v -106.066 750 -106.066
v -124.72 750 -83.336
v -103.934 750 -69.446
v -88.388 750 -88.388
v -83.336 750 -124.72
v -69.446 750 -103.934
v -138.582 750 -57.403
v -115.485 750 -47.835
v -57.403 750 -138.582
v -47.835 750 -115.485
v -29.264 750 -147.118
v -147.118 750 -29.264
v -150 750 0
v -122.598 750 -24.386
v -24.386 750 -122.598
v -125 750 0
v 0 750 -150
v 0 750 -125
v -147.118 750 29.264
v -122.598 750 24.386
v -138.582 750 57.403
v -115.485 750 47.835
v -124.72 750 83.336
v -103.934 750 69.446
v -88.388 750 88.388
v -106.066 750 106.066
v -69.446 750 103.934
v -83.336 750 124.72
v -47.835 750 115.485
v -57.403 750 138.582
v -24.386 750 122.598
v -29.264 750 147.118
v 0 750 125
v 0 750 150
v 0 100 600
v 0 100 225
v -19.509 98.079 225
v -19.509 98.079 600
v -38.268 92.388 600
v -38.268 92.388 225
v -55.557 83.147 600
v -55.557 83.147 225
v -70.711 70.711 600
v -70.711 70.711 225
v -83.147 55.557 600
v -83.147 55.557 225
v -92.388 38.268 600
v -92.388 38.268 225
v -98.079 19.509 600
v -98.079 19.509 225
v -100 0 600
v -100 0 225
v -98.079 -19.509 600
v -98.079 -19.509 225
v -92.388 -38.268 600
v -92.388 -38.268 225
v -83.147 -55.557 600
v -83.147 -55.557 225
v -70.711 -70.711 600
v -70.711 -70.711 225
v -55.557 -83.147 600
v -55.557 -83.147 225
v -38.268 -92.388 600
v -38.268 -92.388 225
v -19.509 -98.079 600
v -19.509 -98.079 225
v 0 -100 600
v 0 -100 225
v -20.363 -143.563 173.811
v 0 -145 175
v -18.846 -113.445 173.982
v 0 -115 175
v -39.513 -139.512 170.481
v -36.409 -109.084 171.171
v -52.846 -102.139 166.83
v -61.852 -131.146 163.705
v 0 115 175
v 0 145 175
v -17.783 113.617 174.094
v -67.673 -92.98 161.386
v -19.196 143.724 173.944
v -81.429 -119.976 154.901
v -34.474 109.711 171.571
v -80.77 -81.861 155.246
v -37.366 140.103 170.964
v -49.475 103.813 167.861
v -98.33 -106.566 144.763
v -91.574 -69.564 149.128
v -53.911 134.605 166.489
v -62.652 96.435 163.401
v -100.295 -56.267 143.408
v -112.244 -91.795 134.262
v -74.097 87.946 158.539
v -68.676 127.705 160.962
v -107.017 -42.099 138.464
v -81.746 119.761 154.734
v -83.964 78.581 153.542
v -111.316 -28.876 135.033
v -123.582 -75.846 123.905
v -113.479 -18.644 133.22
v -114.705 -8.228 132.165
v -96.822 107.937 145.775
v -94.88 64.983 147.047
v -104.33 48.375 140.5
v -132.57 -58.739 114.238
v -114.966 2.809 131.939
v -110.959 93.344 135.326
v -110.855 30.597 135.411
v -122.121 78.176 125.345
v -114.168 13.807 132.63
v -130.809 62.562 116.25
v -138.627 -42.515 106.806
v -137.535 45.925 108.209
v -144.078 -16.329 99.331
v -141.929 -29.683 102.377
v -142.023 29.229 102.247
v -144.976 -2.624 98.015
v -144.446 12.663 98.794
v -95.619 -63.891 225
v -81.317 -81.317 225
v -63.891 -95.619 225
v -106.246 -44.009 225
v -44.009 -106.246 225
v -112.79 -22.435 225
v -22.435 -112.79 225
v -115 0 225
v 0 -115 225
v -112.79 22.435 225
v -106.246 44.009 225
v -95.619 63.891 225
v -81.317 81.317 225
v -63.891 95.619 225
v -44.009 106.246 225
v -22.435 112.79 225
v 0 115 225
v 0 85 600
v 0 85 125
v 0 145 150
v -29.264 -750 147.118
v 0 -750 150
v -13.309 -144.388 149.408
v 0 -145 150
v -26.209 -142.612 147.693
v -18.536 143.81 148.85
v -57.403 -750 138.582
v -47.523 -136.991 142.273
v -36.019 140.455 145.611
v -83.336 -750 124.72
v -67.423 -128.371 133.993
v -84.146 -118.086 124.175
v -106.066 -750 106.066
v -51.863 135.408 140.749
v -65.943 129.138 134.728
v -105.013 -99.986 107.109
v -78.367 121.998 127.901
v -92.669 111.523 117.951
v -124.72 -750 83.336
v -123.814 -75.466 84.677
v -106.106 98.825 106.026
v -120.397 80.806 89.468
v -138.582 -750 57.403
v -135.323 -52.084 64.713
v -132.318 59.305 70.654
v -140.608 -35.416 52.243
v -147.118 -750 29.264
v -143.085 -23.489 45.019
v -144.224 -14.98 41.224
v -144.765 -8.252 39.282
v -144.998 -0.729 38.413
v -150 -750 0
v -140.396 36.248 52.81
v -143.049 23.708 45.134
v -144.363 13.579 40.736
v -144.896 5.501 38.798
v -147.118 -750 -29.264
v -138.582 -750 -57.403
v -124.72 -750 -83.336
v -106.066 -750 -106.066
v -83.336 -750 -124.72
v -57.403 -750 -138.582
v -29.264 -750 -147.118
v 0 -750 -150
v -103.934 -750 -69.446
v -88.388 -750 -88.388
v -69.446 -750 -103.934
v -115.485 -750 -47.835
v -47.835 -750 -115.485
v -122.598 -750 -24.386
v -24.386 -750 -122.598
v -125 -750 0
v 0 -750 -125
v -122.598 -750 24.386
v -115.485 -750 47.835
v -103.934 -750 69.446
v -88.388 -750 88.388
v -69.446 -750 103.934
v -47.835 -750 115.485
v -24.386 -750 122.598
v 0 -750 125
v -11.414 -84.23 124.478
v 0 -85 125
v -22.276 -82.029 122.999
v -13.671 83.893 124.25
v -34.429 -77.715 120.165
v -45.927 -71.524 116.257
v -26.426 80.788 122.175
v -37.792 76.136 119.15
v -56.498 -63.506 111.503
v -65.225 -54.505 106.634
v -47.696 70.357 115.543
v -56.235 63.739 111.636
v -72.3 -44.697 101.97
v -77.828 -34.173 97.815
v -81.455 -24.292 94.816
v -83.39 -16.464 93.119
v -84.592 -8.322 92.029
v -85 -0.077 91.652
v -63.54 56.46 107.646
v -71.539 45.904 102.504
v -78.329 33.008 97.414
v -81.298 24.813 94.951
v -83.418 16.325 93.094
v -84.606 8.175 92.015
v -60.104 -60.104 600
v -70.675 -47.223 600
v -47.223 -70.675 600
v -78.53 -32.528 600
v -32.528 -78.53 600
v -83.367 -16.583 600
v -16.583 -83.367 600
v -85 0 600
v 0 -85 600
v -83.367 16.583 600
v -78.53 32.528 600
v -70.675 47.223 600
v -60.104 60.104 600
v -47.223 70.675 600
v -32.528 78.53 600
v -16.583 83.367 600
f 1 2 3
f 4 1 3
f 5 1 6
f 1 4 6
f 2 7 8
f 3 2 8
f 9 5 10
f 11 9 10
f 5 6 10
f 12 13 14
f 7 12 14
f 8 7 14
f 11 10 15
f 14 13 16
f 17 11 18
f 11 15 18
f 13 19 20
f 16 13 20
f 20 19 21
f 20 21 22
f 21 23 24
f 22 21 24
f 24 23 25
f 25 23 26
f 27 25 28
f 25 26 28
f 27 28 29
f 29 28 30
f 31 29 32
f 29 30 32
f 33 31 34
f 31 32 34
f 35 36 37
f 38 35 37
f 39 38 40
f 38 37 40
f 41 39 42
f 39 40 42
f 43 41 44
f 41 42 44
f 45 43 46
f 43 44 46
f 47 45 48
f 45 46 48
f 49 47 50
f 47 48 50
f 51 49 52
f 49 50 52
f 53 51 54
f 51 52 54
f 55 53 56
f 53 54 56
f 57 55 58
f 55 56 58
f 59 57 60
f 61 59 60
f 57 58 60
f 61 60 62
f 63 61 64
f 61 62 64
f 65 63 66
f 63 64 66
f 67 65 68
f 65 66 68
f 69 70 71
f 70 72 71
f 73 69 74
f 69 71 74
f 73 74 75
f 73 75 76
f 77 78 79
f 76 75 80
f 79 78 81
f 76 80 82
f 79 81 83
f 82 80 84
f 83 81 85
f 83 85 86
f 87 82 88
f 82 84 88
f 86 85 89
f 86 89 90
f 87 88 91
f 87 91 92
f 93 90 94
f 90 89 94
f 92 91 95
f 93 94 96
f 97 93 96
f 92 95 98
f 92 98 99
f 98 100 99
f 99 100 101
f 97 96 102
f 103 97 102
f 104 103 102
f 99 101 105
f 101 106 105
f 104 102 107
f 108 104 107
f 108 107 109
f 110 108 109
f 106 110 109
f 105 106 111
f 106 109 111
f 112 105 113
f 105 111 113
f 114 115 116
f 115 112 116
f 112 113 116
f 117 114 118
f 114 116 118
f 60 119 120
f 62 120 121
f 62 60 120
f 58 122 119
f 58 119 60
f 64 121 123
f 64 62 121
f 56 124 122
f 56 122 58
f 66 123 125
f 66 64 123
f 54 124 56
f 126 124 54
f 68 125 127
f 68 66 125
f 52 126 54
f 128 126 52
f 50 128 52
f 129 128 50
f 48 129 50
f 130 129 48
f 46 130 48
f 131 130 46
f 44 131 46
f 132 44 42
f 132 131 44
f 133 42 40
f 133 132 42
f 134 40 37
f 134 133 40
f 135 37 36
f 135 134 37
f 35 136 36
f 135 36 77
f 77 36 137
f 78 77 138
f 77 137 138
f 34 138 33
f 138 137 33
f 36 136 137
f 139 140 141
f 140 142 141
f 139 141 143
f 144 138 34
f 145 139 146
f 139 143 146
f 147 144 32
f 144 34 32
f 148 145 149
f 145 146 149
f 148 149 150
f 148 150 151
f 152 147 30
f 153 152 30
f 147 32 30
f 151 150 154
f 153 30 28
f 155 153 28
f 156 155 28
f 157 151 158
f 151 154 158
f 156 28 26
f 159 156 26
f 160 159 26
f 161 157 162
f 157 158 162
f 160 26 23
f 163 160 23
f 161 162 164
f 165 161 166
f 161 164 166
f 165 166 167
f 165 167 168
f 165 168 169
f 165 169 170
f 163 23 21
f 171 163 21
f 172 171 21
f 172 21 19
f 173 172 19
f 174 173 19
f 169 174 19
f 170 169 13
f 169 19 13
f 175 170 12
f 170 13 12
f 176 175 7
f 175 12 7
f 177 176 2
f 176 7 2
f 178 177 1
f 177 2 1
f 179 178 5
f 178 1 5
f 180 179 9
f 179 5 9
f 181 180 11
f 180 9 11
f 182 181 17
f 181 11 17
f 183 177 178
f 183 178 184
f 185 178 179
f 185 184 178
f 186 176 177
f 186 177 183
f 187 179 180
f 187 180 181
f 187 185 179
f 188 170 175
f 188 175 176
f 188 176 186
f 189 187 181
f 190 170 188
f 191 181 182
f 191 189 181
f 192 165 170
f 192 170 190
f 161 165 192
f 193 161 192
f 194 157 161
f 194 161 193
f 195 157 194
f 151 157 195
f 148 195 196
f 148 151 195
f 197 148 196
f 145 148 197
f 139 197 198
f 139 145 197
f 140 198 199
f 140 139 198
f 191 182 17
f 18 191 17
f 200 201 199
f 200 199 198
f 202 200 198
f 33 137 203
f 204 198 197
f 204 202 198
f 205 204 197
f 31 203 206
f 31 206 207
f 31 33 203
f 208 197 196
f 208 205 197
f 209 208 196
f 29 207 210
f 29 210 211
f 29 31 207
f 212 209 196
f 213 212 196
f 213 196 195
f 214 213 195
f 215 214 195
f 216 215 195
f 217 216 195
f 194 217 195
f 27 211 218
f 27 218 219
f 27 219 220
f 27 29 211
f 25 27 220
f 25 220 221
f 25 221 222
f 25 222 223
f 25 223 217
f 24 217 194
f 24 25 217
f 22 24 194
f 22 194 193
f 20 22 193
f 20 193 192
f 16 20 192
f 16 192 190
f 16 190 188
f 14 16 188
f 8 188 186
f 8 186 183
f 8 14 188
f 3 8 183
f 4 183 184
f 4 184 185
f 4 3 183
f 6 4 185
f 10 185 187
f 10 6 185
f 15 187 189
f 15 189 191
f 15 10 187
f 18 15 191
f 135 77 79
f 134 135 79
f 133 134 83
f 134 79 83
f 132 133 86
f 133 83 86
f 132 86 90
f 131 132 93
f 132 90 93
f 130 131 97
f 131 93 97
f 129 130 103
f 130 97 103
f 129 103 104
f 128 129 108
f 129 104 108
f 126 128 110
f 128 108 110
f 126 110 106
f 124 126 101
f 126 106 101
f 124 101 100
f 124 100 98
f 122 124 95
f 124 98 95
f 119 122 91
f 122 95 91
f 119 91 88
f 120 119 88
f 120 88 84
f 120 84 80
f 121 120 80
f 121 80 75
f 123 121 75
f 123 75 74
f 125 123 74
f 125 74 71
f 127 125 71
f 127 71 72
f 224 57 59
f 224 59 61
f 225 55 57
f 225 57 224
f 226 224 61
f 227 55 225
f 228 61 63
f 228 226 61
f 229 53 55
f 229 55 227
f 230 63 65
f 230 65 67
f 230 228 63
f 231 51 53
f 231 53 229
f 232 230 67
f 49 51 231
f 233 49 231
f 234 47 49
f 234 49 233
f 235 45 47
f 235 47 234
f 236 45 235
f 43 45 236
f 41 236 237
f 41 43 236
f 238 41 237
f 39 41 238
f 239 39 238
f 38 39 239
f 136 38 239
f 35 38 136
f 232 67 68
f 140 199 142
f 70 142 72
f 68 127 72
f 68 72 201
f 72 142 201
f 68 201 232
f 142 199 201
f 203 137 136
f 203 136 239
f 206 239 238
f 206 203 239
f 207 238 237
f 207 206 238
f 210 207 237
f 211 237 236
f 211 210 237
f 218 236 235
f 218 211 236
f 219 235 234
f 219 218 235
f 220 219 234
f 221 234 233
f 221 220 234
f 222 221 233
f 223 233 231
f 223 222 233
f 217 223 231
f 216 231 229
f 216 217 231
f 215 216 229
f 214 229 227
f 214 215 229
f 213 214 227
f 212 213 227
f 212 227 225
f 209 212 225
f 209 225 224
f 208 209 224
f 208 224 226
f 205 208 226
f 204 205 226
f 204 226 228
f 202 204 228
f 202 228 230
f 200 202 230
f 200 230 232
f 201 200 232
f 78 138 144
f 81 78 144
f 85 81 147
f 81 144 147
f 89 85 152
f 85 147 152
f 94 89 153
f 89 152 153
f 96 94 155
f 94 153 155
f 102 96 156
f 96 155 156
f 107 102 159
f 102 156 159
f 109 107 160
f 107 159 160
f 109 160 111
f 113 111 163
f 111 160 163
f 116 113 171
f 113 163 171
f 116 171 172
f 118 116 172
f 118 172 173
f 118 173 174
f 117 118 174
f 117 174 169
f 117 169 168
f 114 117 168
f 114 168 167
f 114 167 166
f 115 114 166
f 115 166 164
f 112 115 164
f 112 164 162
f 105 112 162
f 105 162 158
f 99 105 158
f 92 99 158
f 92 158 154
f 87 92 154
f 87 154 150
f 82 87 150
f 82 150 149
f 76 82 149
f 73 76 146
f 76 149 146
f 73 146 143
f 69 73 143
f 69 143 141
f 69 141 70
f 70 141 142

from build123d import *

# Parameters (mm, degrees)
BOX002_W               = 500
BOX002_H               = 1800
BOX002_DEPTH           = 1000
CYLINDER011_R          = 125
CYLINDER011_DEPTH      = 1500
CYLINDER011_ROLL_ANGLE = 90
BOX001_W               = 500
BOX001_H               = 1800
BOX001_DEPTH           = 1000
CYLINDER007_R          = 125
CYLINDER007_DEPTH      = 1500
CYLINDER007_ROLL_ANGLE = 90
CYLINDER006_R          = 85
CYLINDER006_DEPTH      = 600
CYLINDER002_R          = 115
CYLINDER002_DEPTH      = 225
CYLINDER001_R          = 150
CYLINDER001_DEPTH      = 1500
CYLINDER001_ROLL_ANGLE = 90
CYLINDER_R             = 100
CYLINDER_DEPTH         = 600
BOX_W                  = 500
BOX_H                  = 500
BOX_DEPTH              = 500
CYLINDER004_R          = 145
CYLINDER004_DEPTH      = 600
CYLINDER005_R          = 300
CYLINDER005_DEPTH      = 600
CYLINDER003_R          = 175
CYLINDER003_DEPTH      = 400
CYLINDER003_ROLL_ANGLE = 90
CYLINDER010_R          = 150
CYLINDER010_DEPTH      = 200
CYLINDER010_ROLL_ANGLE = 90
CYLINDER009_R          = 150
CYLINDER009_DEPTH      = 200
CYLINDER009_ROLL_ANGLE = 90


with BuildPart() as cube002:
    # Box002 → Box002 (new body)
    with BuildSketch(Plane(origin=(0, -815, -274), x_dir=(1, 0, 0), z_dir=(0, 0, 1))):
        with Locations((250, 900)):
            Rectangle(BOX002_W, BOX002_H)
    extrude(amount=BOX002_DEPTH)


with BuildPart() as cylinder011:
    # Cylinder011 → Cylinder011 (new body)
    with BuildSketch(Plane.XY):
        Circle(CYLINDER011_R)
    extrude(amount=CYLINDER011_DEPTH)


with BuildPart() as cylinder011_1:
    # Cylinder011 roll: moved
    add(cylinder011.part.rotate(Axis((0, 0, 0), (1, 0, 0)), CYLINDER011_ROLL_ANGLE))


with BuildPart() as cylinder011_2:
    # Cylinder011 placement: moved
    add(cylinder011_1.part.moved(Location((0, 750, 0))))


with BuildPart() as cube001:
    # Box001 → Box001 (new body)
    with BuildSketch(Plane(origin=(0, -815, -274), x_dir=(1, 0, 0), z_dir=(0, 0, 1))):
        with Locations((250, 900)):
            Rectangle(BOX001_W, BOX001_H)
    extrude(amount=BOX001_DEPTH)


with BuildPart() as cylinder007:
    # Cylinder007 → Cylinder007 (new body)
    with BuildSketch(Plane.XY):
        Circle(CYLINDER007_R)
    extrude(amount=CYLINDER007_DEPTH)


with BuildPart() as cylinder007_1:
    # Cylinder007 roll: moved
    add(cylinder007.part.rotate(Axis((0, 0, 0), (1, 0, 0)), CYLINDER007_ROLL_ANGLE))


with BuildPart() as cylinder007_2:
    # Cylinder007 placement: moved
    add(cylinder007_1.part.moved(Location((0, 750, 0))))


with BuildPart() as cylinder006:
    # Cylinder006 → Cylinder006 (new body)
    with BuildSketch(Plane.XY):
        Circle(CYLINDER006_R)
    extrude(amount=CYLINDER006_DEPTH)


with BuildPart() as cylinder002:
    # Cylinder002 → Cylinder002 (new body)
    with BuildSketch(Plane.XY):
        Circle(CYLINDER002_R)
    extrude(amount=CYLINDER002_DEPTH)


with BuildPart() as cylinder001:
    # Cylinder001 → Cylinder001 (new body)
    with BuildSketch(Plane.XY):
        Circle(CYLINDER001_R)
    extrude(amount=CYLINDER001_DEPTH)


with BuildPart() as cylinder001_1:
    # Cylinder001 roll: moved
    add(cylinder001.part.rotate(Axis((0, 0, 0), (1, 0, 0)), CYLINDER001_ROLL_ANGLE))


with BuildPart() as cylinder001_2:
    # Cylinder001 placement: moved
    add(cylinder001_1.part.moved(Location((0, 750, 0))))


with BuildPart() as cylinder:
    # Cylinder → Cylinder (new body)
    with BuildSketch(Plane.XY):
        Circle(CYLINDER_R)
    extrude(amount=CYLINDER_DEPTH)


with BuildPart() as cube:
    # Box → Box (new body)
    with BuildSketch(Plane(origin=(-226, -279, -480), x_dir=(1, 0, 0), z_dir=(0, 0, 1))):
        with Locations((250, 250)):
            Rectangle(BOX_W, BOX_H)
    extrude(amount=BOX_DEPTH)


with BuildPart() as cylinder004:
    # Cylinder004 → Cylinder004 (new body)
    with BuildSketch(Plane.XY):
        Circle(CYLINDER004_R)
    extrude(amount=CYLINDER004_DEPTH)


with BuildPart() as cut:
    # Cylinder005 → Cylinder005 (new body)
    with BuildSketch(Plane.XY):
        Circle(CYLINDER005_R)
    extrude(amount=CYLINDER005_DEPTH)

    # Cut: cut Cylinder004
    add(cylinder004.part, mode=Mode.SUBTRACT)


with BuildPart() as cut005:
    # Cylinder003 → Cylinder003 (new body)
    with BuildSketch(Plane.XY):
        Circle(CYLINDER003_R)
    extrude(amount=CYLINDER003_DEPTH)


with BuildPart() as cut005_1:
    # Cylinder003 roll: moved
    add(cut005.part.rotate(Axis((0, 0, 0), (1, 0, 0)), CYLINDER003_ROLL_ANGLE))


with BuildPart() as cut005_2:
    # Cylinder003 placement: moved
    add(cut005_1.part.moved(Location((0, 200, 0))))

    # Cut001: cut Cut
    add(cut.part, mode=Mode.SUBTRACT)

    # Cut002: cut Cube
    add(cube.part, mode=Mode.SUBTRACT)

    # Fusion: union Cylinder002, Cylinder001, Cylinder
    add(cylinder002.part)
    add(cylinder001_2.part)
    add(cylinder.part)

    # Cut003: cut Cylinder006
    add(cylinder006.part, mode=Mode.SUBTRACT)

    # Cut004: cut Cylinder007
    add(cylinder007_2.part, mode=Mode.SUBTRACT)

    # Cut005: cut Cube001
    add(cube001.part, mode=Mode.SUBTRACT)


with BuildPart() as cylinder010:
    # Cylinder010 → Cylinder010 (new body)
    with BuildSketch(Plane.XY):
        Circle(CYLINDER010_R)
    extrude(amount=CYLINDER010_DEPTH)


with BuildPart() as cylinder010_1:
    # Cylinder010 roll: moved
    add(cylinder010.part.rotate(Axis((0, 0, 0), (1, 0, 0)), CYLINDER010_ROLL_ANGLE))


with BuildPart() as cylinder010_2:
    # Cylinder010 placement: moved
    add(cylinder010_1.part.moved(Location((0, 350, 0))))


with BuildPart() as cut007:
    # Cylinder009 → Cylinder009 (new body)
    with BuildSketch(Plane.XY):
        Circle(CYLINDER009_R)
    extrude(amount=CYLINDER009_DEPTH)


with BuildPart() as cut007_1:
    # Cylinder009 roll: moved
    add(cut007.part.rotate(Axis((0, 0, 0), (1, 0, 0)), CYLINDER009_ROLL_ANGLE))


with BuildPart() as cut007_2:
    # Cylinder009 placement: moved
    add(cut007_1.part.moved(Location((0, -150, 0))))

    # Fusion002: union Cylinder010
    add(cylinder010_2.part)

    # Fusion003: union Cut005
    add(cut005_2.part)

    # Cut006: cut Cylinder011
    add(cylinder011_2.part, mode=Mode.SUBTRACT)

    # Cut007: cut Cube002
    add(cube002.part, mode=Mode.SUBTRACT)


solid = cut007_2.part
